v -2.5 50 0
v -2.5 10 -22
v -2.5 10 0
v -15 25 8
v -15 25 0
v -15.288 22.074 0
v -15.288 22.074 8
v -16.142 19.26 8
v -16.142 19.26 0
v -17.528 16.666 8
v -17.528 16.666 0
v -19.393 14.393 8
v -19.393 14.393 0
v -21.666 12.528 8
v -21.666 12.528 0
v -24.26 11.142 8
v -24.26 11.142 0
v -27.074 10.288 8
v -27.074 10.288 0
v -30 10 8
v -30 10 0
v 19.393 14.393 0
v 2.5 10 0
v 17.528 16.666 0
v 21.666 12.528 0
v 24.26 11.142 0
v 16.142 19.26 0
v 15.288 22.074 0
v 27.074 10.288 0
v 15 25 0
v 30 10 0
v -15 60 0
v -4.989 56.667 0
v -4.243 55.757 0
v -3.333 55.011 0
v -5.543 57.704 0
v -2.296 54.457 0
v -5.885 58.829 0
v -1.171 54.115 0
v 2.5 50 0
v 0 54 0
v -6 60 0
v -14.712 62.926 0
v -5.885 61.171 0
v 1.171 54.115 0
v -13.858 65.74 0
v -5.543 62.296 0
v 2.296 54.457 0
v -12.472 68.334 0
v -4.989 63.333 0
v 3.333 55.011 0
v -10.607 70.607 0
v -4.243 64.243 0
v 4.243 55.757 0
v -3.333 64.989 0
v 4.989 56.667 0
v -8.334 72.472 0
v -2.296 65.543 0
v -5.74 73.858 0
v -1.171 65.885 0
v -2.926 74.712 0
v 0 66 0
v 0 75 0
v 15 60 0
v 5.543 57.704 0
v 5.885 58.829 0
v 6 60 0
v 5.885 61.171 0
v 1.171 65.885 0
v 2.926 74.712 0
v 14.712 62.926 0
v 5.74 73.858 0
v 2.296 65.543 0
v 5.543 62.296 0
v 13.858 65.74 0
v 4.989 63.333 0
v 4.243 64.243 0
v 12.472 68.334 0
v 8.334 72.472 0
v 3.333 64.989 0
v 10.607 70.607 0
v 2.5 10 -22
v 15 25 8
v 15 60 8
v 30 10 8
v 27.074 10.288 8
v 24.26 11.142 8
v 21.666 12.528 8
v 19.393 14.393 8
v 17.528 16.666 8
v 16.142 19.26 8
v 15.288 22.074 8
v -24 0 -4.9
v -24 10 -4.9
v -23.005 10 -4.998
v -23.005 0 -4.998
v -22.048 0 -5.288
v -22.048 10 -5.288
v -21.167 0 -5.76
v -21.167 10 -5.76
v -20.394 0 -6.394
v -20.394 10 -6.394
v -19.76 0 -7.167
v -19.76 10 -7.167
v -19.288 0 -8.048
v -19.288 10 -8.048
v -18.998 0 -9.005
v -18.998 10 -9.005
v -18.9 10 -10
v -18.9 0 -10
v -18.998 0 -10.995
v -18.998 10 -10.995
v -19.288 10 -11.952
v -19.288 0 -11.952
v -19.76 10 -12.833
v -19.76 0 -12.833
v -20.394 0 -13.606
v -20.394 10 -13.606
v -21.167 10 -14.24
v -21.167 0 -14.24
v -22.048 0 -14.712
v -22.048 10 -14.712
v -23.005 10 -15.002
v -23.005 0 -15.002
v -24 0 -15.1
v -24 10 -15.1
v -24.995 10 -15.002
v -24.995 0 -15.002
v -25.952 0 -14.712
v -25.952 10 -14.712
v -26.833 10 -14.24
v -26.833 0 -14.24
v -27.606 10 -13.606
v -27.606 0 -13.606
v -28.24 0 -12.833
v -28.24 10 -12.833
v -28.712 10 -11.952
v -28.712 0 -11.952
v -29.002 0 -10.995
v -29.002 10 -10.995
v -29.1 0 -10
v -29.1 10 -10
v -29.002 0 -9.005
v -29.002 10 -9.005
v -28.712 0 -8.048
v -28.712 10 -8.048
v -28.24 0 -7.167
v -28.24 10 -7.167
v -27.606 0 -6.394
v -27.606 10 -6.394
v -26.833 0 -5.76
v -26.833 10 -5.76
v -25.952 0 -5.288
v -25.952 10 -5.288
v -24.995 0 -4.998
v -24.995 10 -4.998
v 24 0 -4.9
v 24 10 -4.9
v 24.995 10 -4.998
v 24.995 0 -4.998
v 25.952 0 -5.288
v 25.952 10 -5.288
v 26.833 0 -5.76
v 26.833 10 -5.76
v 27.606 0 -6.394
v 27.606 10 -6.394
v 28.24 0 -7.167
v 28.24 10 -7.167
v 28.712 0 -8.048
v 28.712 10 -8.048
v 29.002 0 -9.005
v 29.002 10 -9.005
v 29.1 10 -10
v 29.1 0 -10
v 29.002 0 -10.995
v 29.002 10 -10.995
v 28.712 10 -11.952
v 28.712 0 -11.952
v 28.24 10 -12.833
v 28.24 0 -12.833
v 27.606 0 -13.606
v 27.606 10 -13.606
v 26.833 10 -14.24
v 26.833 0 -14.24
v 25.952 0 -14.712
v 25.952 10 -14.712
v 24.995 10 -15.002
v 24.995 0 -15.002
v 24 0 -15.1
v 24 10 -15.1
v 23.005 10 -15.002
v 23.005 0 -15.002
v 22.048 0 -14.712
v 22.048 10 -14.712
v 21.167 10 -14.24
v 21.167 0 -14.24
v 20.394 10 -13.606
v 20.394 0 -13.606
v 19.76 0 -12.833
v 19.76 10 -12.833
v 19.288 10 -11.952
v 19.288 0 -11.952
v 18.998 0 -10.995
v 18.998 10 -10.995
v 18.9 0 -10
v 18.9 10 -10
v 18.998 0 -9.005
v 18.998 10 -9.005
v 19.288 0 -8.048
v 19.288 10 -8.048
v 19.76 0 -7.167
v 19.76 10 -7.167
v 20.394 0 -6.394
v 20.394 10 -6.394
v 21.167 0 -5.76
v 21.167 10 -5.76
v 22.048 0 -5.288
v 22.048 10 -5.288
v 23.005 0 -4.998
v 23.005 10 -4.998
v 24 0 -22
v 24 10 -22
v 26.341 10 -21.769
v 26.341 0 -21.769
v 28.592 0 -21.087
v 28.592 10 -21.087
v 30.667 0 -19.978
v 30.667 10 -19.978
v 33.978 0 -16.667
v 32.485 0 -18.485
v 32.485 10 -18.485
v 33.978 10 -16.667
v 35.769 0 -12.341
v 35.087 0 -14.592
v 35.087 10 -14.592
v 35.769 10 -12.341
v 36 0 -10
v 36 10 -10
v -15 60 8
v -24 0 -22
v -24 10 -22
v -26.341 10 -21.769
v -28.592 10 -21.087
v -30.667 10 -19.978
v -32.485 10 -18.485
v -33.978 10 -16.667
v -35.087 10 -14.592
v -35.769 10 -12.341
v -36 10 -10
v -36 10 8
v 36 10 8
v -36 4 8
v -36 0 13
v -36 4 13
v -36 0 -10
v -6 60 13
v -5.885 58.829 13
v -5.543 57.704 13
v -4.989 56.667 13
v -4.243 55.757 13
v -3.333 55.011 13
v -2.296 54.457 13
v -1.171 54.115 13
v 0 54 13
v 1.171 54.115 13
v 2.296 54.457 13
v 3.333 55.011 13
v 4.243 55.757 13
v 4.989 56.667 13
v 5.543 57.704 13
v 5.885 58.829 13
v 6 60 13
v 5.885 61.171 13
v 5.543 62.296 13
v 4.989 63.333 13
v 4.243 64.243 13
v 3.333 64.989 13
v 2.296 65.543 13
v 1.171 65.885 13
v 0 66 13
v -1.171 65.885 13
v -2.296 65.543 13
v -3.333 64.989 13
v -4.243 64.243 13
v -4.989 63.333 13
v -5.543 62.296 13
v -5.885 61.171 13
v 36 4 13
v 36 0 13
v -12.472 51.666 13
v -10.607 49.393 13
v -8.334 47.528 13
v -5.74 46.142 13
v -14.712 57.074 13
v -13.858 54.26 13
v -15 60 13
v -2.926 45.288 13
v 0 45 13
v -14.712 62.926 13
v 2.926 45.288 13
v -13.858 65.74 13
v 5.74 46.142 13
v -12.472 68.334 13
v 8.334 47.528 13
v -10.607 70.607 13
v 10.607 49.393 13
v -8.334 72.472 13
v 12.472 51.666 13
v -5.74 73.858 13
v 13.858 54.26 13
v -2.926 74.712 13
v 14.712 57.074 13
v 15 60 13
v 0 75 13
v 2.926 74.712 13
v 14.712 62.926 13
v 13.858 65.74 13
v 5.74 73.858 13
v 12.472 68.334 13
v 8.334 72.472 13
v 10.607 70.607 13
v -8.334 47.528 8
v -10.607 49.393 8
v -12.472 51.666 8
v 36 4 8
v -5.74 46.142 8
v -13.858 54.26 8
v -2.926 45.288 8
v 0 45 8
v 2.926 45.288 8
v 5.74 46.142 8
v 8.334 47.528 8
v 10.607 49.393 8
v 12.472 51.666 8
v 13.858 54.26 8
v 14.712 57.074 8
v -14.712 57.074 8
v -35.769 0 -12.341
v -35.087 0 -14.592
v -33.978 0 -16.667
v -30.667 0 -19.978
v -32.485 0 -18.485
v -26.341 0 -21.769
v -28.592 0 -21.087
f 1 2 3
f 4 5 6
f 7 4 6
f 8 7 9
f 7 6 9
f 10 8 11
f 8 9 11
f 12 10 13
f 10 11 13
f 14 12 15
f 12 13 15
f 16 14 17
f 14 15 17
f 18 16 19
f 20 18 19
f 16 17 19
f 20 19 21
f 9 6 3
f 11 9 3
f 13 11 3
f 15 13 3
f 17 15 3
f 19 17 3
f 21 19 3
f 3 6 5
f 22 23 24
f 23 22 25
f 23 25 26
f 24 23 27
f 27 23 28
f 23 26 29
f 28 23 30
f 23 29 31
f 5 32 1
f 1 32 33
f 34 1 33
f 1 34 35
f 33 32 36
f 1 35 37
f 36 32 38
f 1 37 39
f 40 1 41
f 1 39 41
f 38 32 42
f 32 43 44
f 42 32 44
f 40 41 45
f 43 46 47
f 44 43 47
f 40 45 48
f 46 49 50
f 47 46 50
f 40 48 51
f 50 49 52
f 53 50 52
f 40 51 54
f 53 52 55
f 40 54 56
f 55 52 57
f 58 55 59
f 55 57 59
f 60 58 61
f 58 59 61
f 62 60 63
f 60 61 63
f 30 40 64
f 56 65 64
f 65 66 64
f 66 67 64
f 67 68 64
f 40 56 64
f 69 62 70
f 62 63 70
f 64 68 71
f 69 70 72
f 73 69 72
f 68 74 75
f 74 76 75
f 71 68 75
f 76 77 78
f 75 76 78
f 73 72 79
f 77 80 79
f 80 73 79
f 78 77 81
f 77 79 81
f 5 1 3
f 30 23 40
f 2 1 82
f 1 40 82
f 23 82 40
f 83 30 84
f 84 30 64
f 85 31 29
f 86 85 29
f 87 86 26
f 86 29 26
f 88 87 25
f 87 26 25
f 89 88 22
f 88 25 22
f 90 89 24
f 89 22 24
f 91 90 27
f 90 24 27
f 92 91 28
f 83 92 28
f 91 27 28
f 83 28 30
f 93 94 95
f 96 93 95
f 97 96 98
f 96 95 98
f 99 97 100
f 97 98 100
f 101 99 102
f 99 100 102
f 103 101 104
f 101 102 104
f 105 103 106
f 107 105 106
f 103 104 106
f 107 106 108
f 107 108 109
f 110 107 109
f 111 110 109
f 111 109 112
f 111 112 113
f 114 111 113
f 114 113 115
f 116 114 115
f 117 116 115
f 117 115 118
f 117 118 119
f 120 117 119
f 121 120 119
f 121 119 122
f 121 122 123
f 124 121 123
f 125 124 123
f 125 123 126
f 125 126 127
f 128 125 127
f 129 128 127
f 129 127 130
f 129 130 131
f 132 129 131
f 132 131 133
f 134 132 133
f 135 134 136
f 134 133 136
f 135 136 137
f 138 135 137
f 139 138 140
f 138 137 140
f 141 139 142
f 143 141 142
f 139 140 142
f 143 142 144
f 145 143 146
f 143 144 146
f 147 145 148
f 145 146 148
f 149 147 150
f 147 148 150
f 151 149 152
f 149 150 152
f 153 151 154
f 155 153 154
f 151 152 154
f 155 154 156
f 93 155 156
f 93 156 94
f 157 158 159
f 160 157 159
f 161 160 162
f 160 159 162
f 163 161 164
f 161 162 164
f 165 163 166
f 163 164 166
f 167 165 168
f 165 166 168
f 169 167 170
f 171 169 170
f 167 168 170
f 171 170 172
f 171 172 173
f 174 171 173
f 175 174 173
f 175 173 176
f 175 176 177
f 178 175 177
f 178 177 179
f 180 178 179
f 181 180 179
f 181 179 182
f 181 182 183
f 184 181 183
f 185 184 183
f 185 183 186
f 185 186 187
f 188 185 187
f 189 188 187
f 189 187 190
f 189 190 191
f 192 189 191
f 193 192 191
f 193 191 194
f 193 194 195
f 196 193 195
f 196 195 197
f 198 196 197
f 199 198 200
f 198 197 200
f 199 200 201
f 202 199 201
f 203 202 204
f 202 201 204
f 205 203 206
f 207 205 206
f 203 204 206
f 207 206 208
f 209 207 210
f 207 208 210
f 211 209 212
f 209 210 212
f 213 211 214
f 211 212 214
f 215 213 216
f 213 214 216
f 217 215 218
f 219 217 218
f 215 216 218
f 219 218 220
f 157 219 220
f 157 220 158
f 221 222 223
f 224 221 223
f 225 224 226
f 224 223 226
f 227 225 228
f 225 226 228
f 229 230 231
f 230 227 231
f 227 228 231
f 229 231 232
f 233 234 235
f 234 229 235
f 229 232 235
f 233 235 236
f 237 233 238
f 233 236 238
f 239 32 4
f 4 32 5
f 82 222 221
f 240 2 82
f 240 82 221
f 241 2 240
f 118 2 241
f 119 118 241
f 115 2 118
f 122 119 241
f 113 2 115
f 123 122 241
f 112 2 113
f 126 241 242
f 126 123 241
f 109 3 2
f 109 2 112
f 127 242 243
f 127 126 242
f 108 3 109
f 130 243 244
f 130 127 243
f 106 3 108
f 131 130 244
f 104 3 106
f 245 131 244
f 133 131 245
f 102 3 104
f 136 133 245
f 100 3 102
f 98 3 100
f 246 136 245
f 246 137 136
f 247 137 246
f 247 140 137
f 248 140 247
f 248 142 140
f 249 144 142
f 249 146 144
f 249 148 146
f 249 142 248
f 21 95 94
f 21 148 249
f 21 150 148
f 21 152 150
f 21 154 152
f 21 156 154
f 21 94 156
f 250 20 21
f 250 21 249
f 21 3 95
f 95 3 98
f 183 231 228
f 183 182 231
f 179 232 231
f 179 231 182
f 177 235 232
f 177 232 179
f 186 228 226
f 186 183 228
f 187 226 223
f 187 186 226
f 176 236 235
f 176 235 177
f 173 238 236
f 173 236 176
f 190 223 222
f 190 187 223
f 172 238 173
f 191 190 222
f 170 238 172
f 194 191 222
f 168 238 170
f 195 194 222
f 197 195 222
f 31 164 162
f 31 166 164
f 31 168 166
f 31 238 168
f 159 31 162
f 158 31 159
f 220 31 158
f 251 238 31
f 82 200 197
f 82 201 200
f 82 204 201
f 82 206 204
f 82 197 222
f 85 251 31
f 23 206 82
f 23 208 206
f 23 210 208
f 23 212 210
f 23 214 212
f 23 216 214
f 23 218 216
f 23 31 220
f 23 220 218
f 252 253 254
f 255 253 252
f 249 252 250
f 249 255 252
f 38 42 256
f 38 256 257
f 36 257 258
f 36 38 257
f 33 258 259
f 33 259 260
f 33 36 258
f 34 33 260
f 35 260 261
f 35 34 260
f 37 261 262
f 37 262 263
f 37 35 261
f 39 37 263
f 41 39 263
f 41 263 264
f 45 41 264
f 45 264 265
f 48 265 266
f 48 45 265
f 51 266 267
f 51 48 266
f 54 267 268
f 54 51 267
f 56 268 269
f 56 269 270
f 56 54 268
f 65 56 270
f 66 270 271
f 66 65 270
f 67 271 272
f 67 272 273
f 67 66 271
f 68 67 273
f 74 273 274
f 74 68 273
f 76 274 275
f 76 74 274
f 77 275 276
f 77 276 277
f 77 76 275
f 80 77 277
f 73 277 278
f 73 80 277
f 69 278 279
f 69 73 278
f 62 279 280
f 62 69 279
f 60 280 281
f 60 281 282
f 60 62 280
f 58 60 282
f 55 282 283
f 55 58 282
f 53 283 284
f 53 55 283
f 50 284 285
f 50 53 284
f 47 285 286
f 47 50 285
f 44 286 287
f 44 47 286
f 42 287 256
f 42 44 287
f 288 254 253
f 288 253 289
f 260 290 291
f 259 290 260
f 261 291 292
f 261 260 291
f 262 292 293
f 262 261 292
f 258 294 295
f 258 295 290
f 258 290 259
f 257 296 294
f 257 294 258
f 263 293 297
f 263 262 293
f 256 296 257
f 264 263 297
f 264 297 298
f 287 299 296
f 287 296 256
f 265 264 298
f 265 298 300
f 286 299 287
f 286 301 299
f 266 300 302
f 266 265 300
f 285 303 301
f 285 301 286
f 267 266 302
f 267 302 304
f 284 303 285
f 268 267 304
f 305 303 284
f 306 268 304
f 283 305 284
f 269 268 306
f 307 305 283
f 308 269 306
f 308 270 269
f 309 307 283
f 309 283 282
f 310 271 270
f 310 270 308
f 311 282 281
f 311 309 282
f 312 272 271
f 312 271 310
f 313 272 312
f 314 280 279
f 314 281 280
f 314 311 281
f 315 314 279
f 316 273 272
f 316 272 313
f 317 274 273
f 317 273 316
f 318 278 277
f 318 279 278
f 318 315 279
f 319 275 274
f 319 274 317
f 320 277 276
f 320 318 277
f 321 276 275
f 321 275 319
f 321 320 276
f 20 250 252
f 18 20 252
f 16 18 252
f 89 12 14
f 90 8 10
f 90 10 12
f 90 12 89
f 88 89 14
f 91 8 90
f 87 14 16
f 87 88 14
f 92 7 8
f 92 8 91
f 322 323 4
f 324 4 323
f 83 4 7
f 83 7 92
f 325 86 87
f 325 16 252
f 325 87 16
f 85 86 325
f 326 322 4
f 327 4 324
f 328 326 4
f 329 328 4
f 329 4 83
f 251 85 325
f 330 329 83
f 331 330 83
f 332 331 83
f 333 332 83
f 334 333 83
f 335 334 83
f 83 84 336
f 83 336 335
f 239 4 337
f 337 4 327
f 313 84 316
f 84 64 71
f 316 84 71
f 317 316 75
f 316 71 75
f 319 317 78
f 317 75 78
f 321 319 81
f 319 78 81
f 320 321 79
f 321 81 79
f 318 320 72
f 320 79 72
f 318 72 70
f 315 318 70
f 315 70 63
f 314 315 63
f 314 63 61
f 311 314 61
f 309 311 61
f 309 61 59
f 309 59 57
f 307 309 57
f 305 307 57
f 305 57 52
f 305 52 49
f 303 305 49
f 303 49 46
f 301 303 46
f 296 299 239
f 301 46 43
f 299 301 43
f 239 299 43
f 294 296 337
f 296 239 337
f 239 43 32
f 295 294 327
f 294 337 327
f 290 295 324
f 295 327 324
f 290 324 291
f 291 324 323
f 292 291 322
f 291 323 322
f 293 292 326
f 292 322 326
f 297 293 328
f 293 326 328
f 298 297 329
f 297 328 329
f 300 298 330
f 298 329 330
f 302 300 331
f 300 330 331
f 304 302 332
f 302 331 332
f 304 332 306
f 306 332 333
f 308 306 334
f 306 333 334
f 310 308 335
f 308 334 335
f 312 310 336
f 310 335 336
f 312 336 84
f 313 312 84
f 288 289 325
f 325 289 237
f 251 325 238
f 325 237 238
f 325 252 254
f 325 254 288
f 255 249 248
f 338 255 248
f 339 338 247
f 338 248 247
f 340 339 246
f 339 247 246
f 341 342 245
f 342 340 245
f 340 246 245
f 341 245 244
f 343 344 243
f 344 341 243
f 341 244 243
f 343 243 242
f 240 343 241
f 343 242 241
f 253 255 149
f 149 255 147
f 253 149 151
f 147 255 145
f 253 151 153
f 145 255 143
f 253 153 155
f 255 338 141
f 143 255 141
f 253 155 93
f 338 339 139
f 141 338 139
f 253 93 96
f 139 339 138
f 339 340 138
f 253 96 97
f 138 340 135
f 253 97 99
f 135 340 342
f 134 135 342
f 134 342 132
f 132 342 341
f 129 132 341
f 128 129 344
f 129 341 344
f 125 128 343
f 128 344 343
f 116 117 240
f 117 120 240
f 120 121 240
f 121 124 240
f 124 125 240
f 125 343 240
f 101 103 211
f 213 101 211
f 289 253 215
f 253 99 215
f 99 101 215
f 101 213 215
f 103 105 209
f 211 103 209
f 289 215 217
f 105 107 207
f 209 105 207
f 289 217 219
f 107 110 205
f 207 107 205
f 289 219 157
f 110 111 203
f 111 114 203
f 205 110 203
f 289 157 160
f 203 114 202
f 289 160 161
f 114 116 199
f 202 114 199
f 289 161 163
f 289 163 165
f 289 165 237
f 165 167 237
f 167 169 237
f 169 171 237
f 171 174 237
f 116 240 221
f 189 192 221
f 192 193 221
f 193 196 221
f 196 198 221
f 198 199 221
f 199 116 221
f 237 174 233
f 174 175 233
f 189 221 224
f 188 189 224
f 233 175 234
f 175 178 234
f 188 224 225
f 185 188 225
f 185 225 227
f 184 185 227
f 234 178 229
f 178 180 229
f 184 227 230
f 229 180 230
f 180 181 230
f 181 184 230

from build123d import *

# Parameters (mm, degrees)
BOSS_EXTRUDE1_DEPTH = 8
SKETCH1_3_R         = 6
BOSS_EXTRUDE2_DEPTH = 13
SKETCH2_W           = 72
SKETCH2_H           = 10
BOSS_EXTRUDE3_DEPTH = 22
SKETCH3_R           = 5.1
CUT_EXTRUDE1_DEPTH  = 22
SKETCH4_W           = 72
SKETCH4_H           = 4
BOSS_EXTRUDE4_DEPTH = 5
BOSS_EXTRUDE5_DEPTH = 2.5


with BuildPart() as part:
    # Sketch1 → Boss-Extrude1 (new body)
    with BuildSketch(Plane.XY):
        with BuildLine():
            Line((-36, 10), (-36, 0))
            Line((-36, 0), (36, 0))
            Line((36, 0), (36, 10))
            Line((36, 10), (30, 10))
            ThreePointArc((30, 10), (19.393398282, 14.393398282), (15, 25))
            Line((15, 25), (15, 60))
            ThreePointArc((15, 60), (0, 45), (-15, 60))
            Line((-15, 60), (-15, 25))
            ThreePointArc((-15, 25), (-19.393398282, 14.393398282), (-30, 10))
            Line((-30, 10), (-36, 10))
        make_face()
    extrude(amount=BOSS_EXTRUDE1_DEPTH)

    # Sketch1<3> → Boss-Extrude2 (add)
    with BuildSketch(Plane.XY):
        with BuildLine():
            ThreePointArc((15, 60), (0, 75), (-15, 60))
            ThreePointArc((-15, 60), (0, 45), (15, 60))
        make_face()
        with Locations((0, 60)):
            Circle(SKETCH1_3_R, mode=Mode.SUBTRACT)
    extrude(amount=BOSS_EXTRUDE2_DEPTH)

    # Sketch2 → Boss-Extrude3 (add)
    with BuildSketch(Plane(origin=(0, 0, 0), x_dir=(-1, 0, 0), z_dir=(0, 0, -1))):
        with Locations((0, 5)):
            Rectangle(SKETCH2_W, SKETCH2_H)
    extrude(amount=BOSS_EXTRUDE3_DEPTH)

    # Sketch3 → Cut-Extrude1 (cut)
    with BuildSketch(Plane(origin=(0, 10, 0), x_dir=(1, 0, 0), z_dir=(0, 1, 0))):
        with BuildLine():
            ThreePointArc((-36, 10), (-32.485281374, 18.485281374), (-24, 22))
            Line((-24, 22), (-36, 22))
            Line((-36, 22), (-36, 10))
        make_face()
        with BuildLine():
            Line((36, 22), (24, 22))
            ThreePointArc((24, 22), (32.485281374, 18.485281374), (36, 10))
            Line((36, 10), (36, 22))
        make_face()
        with Locations((-24, 10)):
            Circle(SKETCH3_R)
        with Locations((24, 10)):
            Circle(SKETCH3_R)
    extrude(amount=-CUT_EXTRUDE1_DEPTH, mode=Mode.SUBTRACT)

    # Sketch4 → Boss-Extrude4 (add)
    with BuildSketch(Plane.XY.offset(8)):
        with Locations((0, 2)):
            Rectangle(SKETCH4_W, SKETCH4_H)
    extrude(amount=BOSS_EXTRUDE4_DEPTH)

    # Sketch5 → Boss-Extrude5 (add, symmetric)
    with BuildSketch(Plane(origin=(0, 0, 0), x_dir=(0, 0, -1), z_dir=(1, 0, 0))):
        Polygon((0, 10), (0, 50), (22, 10), align=None)
    extrude(amount=BOSS_EXTRUDE5_DEPTH, both=True)


solid = part.part
